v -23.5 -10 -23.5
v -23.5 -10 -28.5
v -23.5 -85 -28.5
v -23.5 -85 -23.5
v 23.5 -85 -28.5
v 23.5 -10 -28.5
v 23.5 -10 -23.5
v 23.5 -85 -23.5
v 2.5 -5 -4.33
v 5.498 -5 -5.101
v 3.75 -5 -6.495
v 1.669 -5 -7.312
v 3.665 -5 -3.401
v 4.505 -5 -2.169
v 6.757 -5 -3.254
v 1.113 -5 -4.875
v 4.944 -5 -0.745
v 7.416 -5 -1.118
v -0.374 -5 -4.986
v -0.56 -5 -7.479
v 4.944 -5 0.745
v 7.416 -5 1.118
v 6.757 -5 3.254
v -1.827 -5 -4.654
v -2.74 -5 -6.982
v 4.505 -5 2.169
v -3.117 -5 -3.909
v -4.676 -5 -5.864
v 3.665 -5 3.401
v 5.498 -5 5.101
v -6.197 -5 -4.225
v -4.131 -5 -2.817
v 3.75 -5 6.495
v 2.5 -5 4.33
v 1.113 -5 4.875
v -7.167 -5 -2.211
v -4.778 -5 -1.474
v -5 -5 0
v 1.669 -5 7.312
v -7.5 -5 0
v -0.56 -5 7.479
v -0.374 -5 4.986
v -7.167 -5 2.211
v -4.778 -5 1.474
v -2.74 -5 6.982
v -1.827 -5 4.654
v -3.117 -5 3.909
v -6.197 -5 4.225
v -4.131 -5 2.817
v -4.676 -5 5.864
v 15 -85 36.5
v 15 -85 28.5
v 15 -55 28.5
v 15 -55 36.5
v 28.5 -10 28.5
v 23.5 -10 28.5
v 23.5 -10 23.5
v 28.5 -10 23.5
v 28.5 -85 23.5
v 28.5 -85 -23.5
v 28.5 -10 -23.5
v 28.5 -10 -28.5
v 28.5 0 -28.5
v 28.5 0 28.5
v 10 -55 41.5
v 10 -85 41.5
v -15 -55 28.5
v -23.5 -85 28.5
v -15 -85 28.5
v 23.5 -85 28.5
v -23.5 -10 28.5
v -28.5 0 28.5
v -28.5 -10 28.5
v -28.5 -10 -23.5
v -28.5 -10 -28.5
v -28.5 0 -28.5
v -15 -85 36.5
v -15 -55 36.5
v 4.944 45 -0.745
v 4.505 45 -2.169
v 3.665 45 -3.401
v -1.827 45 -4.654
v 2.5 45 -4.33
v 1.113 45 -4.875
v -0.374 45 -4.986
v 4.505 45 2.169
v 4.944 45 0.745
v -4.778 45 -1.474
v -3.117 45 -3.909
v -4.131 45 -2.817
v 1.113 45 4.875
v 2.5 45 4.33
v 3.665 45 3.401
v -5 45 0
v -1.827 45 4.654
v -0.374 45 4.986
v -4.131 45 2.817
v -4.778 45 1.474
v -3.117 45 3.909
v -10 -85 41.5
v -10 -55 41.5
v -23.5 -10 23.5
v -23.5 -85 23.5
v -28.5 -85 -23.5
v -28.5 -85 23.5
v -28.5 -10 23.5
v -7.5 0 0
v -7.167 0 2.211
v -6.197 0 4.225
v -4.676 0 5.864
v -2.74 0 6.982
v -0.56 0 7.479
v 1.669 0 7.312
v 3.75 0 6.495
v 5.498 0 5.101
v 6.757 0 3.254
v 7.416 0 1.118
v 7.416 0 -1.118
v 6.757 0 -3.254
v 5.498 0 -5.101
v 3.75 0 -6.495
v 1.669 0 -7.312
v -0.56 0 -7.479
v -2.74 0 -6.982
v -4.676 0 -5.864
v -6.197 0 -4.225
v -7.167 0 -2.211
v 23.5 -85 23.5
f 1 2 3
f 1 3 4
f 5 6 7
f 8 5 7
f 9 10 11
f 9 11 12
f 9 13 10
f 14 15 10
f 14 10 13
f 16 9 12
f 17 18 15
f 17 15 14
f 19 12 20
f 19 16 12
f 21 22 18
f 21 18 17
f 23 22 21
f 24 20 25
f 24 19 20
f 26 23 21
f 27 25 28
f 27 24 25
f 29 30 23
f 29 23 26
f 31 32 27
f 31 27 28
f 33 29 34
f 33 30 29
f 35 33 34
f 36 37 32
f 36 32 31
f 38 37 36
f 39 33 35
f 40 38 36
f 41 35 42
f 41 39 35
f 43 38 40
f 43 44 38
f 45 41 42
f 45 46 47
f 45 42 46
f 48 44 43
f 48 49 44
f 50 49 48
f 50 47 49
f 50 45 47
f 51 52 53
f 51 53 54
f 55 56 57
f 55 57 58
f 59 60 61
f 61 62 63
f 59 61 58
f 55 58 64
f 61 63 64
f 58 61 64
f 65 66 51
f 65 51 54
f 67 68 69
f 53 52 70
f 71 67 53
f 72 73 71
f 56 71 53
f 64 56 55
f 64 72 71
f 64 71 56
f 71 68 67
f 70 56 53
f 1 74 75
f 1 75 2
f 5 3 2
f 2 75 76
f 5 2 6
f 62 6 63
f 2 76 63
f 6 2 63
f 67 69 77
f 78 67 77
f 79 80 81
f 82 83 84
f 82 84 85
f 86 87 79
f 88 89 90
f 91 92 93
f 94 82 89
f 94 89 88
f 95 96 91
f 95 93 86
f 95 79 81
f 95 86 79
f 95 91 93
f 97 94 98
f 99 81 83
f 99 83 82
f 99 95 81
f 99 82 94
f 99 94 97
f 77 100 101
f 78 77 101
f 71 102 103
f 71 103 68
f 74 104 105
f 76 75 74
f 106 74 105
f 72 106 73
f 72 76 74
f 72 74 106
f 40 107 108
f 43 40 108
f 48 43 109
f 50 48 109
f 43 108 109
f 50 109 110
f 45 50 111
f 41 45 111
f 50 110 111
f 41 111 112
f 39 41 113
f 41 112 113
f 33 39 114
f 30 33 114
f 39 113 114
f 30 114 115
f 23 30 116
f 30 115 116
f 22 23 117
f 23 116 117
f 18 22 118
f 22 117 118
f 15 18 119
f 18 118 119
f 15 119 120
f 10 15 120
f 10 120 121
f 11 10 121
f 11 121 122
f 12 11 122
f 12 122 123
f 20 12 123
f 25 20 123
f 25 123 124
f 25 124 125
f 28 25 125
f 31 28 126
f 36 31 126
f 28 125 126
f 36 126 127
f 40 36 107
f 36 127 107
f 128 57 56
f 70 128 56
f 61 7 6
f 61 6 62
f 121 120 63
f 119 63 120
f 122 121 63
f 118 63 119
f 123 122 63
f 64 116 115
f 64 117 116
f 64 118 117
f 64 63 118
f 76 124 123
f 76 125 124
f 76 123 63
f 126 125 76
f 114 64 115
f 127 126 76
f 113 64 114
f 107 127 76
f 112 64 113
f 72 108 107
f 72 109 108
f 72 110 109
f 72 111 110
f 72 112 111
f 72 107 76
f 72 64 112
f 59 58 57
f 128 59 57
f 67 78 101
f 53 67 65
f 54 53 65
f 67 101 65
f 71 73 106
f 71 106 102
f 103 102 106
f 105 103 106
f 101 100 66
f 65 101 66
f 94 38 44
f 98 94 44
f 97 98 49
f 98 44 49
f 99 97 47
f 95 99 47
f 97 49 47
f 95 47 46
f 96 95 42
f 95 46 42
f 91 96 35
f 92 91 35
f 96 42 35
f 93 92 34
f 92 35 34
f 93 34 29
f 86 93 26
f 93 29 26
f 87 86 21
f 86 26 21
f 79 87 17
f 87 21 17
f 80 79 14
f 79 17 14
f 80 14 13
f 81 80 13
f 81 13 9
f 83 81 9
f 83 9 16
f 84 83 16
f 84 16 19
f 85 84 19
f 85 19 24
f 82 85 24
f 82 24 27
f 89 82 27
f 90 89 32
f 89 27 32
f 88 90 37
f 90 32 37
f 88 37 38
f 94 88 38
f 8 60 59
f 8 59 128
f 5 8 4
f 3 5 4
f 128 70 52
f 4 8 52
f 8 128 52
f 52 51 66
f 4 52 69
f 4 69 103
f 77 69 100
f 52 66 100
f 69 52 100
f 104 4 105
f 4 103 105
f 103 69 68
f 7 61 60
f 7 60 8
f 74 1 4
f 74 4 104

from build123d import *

# Parameters (mm, degrees)
F0_W      = 57
F0_H      = 57
F1_DEPTH  = 10
F2_W      = 5
F2_H      = 47
F2_W_2    = 47
F2_H_2    = 5
F3_DEPTH  = 85.0000008941
F4_W      = 30
F4_H      = 13
F5_DEPTH  = 30
F6_SIZE   = 5
F7_R      = 7.5
F8_DEPTH  = 5
F9_R      = 5
F10_DEPTH = 50


with BuildPart() as f1:
    # F0 (on Front) → F1 (new body)
    with BuildSketch(Plane.XZ):
        Rectangle(F0_W, F0_H)
    extrude(amount=F1_DEPTH)

    # F2 (on face) → F3 (join)
    with BuildSketch(Plane(origin=(0, 0, 0), x_dir=(-1, 0, 0), z_dir=(0, 1, 0))):
        with Locations((-26, 0)):
            Rectangle(F2_W, F2_H)
        with Locations((0, 26)):
            Rectangle(F2_W_2, F2_H_2)
        with Locations((26, 0)):
            Rectangle(F2_W, F2_H)
        Rectangle(F2_W_2, F2_H)
        with Locations((0, -26)):
            Rectangle(F2_W_2, F2_H_2)
    extrude(amount=-F3_DEPTH)

    # F4 (on face) → F5 (join)
    with BuildSketch(Plane.XZ.offset(85.0000008941)):
        with Locations((0, 35)):
            Rectangle(F4_W, F4_H)
    extrude(amount=-F5_DEPTH)

    # F6
    f6_edges = [f1.edges().sort_by_distance(p)[0] for p in [
        (15, -70.000001, 41.5),
        (-15, -70.000001, 41.5),
    ]]
    chamfer(f6_edges, length=F6_SIZE)

    # F7 (on face) → F8 (cut)
    with BuildSketch(Plane(origin=(0, 0, 0), x_dir=(-1, 0, 0), z_dir=(0, 1, 0))):
        Circle(F7_R)
    extrude(amount=-F8_DEPTH, mode=Mode.SUBTRACT)

    # F9 (on face) → F10 (join)
    with BuildSketch(Plane(origin=(0, -5, 0), x_dir=(-1, 0, 0), z_dir=(0, 1, 0))):
        Circle(F9_R)
    extrude(amount=F10_DEPTH)


solid = f1.part
